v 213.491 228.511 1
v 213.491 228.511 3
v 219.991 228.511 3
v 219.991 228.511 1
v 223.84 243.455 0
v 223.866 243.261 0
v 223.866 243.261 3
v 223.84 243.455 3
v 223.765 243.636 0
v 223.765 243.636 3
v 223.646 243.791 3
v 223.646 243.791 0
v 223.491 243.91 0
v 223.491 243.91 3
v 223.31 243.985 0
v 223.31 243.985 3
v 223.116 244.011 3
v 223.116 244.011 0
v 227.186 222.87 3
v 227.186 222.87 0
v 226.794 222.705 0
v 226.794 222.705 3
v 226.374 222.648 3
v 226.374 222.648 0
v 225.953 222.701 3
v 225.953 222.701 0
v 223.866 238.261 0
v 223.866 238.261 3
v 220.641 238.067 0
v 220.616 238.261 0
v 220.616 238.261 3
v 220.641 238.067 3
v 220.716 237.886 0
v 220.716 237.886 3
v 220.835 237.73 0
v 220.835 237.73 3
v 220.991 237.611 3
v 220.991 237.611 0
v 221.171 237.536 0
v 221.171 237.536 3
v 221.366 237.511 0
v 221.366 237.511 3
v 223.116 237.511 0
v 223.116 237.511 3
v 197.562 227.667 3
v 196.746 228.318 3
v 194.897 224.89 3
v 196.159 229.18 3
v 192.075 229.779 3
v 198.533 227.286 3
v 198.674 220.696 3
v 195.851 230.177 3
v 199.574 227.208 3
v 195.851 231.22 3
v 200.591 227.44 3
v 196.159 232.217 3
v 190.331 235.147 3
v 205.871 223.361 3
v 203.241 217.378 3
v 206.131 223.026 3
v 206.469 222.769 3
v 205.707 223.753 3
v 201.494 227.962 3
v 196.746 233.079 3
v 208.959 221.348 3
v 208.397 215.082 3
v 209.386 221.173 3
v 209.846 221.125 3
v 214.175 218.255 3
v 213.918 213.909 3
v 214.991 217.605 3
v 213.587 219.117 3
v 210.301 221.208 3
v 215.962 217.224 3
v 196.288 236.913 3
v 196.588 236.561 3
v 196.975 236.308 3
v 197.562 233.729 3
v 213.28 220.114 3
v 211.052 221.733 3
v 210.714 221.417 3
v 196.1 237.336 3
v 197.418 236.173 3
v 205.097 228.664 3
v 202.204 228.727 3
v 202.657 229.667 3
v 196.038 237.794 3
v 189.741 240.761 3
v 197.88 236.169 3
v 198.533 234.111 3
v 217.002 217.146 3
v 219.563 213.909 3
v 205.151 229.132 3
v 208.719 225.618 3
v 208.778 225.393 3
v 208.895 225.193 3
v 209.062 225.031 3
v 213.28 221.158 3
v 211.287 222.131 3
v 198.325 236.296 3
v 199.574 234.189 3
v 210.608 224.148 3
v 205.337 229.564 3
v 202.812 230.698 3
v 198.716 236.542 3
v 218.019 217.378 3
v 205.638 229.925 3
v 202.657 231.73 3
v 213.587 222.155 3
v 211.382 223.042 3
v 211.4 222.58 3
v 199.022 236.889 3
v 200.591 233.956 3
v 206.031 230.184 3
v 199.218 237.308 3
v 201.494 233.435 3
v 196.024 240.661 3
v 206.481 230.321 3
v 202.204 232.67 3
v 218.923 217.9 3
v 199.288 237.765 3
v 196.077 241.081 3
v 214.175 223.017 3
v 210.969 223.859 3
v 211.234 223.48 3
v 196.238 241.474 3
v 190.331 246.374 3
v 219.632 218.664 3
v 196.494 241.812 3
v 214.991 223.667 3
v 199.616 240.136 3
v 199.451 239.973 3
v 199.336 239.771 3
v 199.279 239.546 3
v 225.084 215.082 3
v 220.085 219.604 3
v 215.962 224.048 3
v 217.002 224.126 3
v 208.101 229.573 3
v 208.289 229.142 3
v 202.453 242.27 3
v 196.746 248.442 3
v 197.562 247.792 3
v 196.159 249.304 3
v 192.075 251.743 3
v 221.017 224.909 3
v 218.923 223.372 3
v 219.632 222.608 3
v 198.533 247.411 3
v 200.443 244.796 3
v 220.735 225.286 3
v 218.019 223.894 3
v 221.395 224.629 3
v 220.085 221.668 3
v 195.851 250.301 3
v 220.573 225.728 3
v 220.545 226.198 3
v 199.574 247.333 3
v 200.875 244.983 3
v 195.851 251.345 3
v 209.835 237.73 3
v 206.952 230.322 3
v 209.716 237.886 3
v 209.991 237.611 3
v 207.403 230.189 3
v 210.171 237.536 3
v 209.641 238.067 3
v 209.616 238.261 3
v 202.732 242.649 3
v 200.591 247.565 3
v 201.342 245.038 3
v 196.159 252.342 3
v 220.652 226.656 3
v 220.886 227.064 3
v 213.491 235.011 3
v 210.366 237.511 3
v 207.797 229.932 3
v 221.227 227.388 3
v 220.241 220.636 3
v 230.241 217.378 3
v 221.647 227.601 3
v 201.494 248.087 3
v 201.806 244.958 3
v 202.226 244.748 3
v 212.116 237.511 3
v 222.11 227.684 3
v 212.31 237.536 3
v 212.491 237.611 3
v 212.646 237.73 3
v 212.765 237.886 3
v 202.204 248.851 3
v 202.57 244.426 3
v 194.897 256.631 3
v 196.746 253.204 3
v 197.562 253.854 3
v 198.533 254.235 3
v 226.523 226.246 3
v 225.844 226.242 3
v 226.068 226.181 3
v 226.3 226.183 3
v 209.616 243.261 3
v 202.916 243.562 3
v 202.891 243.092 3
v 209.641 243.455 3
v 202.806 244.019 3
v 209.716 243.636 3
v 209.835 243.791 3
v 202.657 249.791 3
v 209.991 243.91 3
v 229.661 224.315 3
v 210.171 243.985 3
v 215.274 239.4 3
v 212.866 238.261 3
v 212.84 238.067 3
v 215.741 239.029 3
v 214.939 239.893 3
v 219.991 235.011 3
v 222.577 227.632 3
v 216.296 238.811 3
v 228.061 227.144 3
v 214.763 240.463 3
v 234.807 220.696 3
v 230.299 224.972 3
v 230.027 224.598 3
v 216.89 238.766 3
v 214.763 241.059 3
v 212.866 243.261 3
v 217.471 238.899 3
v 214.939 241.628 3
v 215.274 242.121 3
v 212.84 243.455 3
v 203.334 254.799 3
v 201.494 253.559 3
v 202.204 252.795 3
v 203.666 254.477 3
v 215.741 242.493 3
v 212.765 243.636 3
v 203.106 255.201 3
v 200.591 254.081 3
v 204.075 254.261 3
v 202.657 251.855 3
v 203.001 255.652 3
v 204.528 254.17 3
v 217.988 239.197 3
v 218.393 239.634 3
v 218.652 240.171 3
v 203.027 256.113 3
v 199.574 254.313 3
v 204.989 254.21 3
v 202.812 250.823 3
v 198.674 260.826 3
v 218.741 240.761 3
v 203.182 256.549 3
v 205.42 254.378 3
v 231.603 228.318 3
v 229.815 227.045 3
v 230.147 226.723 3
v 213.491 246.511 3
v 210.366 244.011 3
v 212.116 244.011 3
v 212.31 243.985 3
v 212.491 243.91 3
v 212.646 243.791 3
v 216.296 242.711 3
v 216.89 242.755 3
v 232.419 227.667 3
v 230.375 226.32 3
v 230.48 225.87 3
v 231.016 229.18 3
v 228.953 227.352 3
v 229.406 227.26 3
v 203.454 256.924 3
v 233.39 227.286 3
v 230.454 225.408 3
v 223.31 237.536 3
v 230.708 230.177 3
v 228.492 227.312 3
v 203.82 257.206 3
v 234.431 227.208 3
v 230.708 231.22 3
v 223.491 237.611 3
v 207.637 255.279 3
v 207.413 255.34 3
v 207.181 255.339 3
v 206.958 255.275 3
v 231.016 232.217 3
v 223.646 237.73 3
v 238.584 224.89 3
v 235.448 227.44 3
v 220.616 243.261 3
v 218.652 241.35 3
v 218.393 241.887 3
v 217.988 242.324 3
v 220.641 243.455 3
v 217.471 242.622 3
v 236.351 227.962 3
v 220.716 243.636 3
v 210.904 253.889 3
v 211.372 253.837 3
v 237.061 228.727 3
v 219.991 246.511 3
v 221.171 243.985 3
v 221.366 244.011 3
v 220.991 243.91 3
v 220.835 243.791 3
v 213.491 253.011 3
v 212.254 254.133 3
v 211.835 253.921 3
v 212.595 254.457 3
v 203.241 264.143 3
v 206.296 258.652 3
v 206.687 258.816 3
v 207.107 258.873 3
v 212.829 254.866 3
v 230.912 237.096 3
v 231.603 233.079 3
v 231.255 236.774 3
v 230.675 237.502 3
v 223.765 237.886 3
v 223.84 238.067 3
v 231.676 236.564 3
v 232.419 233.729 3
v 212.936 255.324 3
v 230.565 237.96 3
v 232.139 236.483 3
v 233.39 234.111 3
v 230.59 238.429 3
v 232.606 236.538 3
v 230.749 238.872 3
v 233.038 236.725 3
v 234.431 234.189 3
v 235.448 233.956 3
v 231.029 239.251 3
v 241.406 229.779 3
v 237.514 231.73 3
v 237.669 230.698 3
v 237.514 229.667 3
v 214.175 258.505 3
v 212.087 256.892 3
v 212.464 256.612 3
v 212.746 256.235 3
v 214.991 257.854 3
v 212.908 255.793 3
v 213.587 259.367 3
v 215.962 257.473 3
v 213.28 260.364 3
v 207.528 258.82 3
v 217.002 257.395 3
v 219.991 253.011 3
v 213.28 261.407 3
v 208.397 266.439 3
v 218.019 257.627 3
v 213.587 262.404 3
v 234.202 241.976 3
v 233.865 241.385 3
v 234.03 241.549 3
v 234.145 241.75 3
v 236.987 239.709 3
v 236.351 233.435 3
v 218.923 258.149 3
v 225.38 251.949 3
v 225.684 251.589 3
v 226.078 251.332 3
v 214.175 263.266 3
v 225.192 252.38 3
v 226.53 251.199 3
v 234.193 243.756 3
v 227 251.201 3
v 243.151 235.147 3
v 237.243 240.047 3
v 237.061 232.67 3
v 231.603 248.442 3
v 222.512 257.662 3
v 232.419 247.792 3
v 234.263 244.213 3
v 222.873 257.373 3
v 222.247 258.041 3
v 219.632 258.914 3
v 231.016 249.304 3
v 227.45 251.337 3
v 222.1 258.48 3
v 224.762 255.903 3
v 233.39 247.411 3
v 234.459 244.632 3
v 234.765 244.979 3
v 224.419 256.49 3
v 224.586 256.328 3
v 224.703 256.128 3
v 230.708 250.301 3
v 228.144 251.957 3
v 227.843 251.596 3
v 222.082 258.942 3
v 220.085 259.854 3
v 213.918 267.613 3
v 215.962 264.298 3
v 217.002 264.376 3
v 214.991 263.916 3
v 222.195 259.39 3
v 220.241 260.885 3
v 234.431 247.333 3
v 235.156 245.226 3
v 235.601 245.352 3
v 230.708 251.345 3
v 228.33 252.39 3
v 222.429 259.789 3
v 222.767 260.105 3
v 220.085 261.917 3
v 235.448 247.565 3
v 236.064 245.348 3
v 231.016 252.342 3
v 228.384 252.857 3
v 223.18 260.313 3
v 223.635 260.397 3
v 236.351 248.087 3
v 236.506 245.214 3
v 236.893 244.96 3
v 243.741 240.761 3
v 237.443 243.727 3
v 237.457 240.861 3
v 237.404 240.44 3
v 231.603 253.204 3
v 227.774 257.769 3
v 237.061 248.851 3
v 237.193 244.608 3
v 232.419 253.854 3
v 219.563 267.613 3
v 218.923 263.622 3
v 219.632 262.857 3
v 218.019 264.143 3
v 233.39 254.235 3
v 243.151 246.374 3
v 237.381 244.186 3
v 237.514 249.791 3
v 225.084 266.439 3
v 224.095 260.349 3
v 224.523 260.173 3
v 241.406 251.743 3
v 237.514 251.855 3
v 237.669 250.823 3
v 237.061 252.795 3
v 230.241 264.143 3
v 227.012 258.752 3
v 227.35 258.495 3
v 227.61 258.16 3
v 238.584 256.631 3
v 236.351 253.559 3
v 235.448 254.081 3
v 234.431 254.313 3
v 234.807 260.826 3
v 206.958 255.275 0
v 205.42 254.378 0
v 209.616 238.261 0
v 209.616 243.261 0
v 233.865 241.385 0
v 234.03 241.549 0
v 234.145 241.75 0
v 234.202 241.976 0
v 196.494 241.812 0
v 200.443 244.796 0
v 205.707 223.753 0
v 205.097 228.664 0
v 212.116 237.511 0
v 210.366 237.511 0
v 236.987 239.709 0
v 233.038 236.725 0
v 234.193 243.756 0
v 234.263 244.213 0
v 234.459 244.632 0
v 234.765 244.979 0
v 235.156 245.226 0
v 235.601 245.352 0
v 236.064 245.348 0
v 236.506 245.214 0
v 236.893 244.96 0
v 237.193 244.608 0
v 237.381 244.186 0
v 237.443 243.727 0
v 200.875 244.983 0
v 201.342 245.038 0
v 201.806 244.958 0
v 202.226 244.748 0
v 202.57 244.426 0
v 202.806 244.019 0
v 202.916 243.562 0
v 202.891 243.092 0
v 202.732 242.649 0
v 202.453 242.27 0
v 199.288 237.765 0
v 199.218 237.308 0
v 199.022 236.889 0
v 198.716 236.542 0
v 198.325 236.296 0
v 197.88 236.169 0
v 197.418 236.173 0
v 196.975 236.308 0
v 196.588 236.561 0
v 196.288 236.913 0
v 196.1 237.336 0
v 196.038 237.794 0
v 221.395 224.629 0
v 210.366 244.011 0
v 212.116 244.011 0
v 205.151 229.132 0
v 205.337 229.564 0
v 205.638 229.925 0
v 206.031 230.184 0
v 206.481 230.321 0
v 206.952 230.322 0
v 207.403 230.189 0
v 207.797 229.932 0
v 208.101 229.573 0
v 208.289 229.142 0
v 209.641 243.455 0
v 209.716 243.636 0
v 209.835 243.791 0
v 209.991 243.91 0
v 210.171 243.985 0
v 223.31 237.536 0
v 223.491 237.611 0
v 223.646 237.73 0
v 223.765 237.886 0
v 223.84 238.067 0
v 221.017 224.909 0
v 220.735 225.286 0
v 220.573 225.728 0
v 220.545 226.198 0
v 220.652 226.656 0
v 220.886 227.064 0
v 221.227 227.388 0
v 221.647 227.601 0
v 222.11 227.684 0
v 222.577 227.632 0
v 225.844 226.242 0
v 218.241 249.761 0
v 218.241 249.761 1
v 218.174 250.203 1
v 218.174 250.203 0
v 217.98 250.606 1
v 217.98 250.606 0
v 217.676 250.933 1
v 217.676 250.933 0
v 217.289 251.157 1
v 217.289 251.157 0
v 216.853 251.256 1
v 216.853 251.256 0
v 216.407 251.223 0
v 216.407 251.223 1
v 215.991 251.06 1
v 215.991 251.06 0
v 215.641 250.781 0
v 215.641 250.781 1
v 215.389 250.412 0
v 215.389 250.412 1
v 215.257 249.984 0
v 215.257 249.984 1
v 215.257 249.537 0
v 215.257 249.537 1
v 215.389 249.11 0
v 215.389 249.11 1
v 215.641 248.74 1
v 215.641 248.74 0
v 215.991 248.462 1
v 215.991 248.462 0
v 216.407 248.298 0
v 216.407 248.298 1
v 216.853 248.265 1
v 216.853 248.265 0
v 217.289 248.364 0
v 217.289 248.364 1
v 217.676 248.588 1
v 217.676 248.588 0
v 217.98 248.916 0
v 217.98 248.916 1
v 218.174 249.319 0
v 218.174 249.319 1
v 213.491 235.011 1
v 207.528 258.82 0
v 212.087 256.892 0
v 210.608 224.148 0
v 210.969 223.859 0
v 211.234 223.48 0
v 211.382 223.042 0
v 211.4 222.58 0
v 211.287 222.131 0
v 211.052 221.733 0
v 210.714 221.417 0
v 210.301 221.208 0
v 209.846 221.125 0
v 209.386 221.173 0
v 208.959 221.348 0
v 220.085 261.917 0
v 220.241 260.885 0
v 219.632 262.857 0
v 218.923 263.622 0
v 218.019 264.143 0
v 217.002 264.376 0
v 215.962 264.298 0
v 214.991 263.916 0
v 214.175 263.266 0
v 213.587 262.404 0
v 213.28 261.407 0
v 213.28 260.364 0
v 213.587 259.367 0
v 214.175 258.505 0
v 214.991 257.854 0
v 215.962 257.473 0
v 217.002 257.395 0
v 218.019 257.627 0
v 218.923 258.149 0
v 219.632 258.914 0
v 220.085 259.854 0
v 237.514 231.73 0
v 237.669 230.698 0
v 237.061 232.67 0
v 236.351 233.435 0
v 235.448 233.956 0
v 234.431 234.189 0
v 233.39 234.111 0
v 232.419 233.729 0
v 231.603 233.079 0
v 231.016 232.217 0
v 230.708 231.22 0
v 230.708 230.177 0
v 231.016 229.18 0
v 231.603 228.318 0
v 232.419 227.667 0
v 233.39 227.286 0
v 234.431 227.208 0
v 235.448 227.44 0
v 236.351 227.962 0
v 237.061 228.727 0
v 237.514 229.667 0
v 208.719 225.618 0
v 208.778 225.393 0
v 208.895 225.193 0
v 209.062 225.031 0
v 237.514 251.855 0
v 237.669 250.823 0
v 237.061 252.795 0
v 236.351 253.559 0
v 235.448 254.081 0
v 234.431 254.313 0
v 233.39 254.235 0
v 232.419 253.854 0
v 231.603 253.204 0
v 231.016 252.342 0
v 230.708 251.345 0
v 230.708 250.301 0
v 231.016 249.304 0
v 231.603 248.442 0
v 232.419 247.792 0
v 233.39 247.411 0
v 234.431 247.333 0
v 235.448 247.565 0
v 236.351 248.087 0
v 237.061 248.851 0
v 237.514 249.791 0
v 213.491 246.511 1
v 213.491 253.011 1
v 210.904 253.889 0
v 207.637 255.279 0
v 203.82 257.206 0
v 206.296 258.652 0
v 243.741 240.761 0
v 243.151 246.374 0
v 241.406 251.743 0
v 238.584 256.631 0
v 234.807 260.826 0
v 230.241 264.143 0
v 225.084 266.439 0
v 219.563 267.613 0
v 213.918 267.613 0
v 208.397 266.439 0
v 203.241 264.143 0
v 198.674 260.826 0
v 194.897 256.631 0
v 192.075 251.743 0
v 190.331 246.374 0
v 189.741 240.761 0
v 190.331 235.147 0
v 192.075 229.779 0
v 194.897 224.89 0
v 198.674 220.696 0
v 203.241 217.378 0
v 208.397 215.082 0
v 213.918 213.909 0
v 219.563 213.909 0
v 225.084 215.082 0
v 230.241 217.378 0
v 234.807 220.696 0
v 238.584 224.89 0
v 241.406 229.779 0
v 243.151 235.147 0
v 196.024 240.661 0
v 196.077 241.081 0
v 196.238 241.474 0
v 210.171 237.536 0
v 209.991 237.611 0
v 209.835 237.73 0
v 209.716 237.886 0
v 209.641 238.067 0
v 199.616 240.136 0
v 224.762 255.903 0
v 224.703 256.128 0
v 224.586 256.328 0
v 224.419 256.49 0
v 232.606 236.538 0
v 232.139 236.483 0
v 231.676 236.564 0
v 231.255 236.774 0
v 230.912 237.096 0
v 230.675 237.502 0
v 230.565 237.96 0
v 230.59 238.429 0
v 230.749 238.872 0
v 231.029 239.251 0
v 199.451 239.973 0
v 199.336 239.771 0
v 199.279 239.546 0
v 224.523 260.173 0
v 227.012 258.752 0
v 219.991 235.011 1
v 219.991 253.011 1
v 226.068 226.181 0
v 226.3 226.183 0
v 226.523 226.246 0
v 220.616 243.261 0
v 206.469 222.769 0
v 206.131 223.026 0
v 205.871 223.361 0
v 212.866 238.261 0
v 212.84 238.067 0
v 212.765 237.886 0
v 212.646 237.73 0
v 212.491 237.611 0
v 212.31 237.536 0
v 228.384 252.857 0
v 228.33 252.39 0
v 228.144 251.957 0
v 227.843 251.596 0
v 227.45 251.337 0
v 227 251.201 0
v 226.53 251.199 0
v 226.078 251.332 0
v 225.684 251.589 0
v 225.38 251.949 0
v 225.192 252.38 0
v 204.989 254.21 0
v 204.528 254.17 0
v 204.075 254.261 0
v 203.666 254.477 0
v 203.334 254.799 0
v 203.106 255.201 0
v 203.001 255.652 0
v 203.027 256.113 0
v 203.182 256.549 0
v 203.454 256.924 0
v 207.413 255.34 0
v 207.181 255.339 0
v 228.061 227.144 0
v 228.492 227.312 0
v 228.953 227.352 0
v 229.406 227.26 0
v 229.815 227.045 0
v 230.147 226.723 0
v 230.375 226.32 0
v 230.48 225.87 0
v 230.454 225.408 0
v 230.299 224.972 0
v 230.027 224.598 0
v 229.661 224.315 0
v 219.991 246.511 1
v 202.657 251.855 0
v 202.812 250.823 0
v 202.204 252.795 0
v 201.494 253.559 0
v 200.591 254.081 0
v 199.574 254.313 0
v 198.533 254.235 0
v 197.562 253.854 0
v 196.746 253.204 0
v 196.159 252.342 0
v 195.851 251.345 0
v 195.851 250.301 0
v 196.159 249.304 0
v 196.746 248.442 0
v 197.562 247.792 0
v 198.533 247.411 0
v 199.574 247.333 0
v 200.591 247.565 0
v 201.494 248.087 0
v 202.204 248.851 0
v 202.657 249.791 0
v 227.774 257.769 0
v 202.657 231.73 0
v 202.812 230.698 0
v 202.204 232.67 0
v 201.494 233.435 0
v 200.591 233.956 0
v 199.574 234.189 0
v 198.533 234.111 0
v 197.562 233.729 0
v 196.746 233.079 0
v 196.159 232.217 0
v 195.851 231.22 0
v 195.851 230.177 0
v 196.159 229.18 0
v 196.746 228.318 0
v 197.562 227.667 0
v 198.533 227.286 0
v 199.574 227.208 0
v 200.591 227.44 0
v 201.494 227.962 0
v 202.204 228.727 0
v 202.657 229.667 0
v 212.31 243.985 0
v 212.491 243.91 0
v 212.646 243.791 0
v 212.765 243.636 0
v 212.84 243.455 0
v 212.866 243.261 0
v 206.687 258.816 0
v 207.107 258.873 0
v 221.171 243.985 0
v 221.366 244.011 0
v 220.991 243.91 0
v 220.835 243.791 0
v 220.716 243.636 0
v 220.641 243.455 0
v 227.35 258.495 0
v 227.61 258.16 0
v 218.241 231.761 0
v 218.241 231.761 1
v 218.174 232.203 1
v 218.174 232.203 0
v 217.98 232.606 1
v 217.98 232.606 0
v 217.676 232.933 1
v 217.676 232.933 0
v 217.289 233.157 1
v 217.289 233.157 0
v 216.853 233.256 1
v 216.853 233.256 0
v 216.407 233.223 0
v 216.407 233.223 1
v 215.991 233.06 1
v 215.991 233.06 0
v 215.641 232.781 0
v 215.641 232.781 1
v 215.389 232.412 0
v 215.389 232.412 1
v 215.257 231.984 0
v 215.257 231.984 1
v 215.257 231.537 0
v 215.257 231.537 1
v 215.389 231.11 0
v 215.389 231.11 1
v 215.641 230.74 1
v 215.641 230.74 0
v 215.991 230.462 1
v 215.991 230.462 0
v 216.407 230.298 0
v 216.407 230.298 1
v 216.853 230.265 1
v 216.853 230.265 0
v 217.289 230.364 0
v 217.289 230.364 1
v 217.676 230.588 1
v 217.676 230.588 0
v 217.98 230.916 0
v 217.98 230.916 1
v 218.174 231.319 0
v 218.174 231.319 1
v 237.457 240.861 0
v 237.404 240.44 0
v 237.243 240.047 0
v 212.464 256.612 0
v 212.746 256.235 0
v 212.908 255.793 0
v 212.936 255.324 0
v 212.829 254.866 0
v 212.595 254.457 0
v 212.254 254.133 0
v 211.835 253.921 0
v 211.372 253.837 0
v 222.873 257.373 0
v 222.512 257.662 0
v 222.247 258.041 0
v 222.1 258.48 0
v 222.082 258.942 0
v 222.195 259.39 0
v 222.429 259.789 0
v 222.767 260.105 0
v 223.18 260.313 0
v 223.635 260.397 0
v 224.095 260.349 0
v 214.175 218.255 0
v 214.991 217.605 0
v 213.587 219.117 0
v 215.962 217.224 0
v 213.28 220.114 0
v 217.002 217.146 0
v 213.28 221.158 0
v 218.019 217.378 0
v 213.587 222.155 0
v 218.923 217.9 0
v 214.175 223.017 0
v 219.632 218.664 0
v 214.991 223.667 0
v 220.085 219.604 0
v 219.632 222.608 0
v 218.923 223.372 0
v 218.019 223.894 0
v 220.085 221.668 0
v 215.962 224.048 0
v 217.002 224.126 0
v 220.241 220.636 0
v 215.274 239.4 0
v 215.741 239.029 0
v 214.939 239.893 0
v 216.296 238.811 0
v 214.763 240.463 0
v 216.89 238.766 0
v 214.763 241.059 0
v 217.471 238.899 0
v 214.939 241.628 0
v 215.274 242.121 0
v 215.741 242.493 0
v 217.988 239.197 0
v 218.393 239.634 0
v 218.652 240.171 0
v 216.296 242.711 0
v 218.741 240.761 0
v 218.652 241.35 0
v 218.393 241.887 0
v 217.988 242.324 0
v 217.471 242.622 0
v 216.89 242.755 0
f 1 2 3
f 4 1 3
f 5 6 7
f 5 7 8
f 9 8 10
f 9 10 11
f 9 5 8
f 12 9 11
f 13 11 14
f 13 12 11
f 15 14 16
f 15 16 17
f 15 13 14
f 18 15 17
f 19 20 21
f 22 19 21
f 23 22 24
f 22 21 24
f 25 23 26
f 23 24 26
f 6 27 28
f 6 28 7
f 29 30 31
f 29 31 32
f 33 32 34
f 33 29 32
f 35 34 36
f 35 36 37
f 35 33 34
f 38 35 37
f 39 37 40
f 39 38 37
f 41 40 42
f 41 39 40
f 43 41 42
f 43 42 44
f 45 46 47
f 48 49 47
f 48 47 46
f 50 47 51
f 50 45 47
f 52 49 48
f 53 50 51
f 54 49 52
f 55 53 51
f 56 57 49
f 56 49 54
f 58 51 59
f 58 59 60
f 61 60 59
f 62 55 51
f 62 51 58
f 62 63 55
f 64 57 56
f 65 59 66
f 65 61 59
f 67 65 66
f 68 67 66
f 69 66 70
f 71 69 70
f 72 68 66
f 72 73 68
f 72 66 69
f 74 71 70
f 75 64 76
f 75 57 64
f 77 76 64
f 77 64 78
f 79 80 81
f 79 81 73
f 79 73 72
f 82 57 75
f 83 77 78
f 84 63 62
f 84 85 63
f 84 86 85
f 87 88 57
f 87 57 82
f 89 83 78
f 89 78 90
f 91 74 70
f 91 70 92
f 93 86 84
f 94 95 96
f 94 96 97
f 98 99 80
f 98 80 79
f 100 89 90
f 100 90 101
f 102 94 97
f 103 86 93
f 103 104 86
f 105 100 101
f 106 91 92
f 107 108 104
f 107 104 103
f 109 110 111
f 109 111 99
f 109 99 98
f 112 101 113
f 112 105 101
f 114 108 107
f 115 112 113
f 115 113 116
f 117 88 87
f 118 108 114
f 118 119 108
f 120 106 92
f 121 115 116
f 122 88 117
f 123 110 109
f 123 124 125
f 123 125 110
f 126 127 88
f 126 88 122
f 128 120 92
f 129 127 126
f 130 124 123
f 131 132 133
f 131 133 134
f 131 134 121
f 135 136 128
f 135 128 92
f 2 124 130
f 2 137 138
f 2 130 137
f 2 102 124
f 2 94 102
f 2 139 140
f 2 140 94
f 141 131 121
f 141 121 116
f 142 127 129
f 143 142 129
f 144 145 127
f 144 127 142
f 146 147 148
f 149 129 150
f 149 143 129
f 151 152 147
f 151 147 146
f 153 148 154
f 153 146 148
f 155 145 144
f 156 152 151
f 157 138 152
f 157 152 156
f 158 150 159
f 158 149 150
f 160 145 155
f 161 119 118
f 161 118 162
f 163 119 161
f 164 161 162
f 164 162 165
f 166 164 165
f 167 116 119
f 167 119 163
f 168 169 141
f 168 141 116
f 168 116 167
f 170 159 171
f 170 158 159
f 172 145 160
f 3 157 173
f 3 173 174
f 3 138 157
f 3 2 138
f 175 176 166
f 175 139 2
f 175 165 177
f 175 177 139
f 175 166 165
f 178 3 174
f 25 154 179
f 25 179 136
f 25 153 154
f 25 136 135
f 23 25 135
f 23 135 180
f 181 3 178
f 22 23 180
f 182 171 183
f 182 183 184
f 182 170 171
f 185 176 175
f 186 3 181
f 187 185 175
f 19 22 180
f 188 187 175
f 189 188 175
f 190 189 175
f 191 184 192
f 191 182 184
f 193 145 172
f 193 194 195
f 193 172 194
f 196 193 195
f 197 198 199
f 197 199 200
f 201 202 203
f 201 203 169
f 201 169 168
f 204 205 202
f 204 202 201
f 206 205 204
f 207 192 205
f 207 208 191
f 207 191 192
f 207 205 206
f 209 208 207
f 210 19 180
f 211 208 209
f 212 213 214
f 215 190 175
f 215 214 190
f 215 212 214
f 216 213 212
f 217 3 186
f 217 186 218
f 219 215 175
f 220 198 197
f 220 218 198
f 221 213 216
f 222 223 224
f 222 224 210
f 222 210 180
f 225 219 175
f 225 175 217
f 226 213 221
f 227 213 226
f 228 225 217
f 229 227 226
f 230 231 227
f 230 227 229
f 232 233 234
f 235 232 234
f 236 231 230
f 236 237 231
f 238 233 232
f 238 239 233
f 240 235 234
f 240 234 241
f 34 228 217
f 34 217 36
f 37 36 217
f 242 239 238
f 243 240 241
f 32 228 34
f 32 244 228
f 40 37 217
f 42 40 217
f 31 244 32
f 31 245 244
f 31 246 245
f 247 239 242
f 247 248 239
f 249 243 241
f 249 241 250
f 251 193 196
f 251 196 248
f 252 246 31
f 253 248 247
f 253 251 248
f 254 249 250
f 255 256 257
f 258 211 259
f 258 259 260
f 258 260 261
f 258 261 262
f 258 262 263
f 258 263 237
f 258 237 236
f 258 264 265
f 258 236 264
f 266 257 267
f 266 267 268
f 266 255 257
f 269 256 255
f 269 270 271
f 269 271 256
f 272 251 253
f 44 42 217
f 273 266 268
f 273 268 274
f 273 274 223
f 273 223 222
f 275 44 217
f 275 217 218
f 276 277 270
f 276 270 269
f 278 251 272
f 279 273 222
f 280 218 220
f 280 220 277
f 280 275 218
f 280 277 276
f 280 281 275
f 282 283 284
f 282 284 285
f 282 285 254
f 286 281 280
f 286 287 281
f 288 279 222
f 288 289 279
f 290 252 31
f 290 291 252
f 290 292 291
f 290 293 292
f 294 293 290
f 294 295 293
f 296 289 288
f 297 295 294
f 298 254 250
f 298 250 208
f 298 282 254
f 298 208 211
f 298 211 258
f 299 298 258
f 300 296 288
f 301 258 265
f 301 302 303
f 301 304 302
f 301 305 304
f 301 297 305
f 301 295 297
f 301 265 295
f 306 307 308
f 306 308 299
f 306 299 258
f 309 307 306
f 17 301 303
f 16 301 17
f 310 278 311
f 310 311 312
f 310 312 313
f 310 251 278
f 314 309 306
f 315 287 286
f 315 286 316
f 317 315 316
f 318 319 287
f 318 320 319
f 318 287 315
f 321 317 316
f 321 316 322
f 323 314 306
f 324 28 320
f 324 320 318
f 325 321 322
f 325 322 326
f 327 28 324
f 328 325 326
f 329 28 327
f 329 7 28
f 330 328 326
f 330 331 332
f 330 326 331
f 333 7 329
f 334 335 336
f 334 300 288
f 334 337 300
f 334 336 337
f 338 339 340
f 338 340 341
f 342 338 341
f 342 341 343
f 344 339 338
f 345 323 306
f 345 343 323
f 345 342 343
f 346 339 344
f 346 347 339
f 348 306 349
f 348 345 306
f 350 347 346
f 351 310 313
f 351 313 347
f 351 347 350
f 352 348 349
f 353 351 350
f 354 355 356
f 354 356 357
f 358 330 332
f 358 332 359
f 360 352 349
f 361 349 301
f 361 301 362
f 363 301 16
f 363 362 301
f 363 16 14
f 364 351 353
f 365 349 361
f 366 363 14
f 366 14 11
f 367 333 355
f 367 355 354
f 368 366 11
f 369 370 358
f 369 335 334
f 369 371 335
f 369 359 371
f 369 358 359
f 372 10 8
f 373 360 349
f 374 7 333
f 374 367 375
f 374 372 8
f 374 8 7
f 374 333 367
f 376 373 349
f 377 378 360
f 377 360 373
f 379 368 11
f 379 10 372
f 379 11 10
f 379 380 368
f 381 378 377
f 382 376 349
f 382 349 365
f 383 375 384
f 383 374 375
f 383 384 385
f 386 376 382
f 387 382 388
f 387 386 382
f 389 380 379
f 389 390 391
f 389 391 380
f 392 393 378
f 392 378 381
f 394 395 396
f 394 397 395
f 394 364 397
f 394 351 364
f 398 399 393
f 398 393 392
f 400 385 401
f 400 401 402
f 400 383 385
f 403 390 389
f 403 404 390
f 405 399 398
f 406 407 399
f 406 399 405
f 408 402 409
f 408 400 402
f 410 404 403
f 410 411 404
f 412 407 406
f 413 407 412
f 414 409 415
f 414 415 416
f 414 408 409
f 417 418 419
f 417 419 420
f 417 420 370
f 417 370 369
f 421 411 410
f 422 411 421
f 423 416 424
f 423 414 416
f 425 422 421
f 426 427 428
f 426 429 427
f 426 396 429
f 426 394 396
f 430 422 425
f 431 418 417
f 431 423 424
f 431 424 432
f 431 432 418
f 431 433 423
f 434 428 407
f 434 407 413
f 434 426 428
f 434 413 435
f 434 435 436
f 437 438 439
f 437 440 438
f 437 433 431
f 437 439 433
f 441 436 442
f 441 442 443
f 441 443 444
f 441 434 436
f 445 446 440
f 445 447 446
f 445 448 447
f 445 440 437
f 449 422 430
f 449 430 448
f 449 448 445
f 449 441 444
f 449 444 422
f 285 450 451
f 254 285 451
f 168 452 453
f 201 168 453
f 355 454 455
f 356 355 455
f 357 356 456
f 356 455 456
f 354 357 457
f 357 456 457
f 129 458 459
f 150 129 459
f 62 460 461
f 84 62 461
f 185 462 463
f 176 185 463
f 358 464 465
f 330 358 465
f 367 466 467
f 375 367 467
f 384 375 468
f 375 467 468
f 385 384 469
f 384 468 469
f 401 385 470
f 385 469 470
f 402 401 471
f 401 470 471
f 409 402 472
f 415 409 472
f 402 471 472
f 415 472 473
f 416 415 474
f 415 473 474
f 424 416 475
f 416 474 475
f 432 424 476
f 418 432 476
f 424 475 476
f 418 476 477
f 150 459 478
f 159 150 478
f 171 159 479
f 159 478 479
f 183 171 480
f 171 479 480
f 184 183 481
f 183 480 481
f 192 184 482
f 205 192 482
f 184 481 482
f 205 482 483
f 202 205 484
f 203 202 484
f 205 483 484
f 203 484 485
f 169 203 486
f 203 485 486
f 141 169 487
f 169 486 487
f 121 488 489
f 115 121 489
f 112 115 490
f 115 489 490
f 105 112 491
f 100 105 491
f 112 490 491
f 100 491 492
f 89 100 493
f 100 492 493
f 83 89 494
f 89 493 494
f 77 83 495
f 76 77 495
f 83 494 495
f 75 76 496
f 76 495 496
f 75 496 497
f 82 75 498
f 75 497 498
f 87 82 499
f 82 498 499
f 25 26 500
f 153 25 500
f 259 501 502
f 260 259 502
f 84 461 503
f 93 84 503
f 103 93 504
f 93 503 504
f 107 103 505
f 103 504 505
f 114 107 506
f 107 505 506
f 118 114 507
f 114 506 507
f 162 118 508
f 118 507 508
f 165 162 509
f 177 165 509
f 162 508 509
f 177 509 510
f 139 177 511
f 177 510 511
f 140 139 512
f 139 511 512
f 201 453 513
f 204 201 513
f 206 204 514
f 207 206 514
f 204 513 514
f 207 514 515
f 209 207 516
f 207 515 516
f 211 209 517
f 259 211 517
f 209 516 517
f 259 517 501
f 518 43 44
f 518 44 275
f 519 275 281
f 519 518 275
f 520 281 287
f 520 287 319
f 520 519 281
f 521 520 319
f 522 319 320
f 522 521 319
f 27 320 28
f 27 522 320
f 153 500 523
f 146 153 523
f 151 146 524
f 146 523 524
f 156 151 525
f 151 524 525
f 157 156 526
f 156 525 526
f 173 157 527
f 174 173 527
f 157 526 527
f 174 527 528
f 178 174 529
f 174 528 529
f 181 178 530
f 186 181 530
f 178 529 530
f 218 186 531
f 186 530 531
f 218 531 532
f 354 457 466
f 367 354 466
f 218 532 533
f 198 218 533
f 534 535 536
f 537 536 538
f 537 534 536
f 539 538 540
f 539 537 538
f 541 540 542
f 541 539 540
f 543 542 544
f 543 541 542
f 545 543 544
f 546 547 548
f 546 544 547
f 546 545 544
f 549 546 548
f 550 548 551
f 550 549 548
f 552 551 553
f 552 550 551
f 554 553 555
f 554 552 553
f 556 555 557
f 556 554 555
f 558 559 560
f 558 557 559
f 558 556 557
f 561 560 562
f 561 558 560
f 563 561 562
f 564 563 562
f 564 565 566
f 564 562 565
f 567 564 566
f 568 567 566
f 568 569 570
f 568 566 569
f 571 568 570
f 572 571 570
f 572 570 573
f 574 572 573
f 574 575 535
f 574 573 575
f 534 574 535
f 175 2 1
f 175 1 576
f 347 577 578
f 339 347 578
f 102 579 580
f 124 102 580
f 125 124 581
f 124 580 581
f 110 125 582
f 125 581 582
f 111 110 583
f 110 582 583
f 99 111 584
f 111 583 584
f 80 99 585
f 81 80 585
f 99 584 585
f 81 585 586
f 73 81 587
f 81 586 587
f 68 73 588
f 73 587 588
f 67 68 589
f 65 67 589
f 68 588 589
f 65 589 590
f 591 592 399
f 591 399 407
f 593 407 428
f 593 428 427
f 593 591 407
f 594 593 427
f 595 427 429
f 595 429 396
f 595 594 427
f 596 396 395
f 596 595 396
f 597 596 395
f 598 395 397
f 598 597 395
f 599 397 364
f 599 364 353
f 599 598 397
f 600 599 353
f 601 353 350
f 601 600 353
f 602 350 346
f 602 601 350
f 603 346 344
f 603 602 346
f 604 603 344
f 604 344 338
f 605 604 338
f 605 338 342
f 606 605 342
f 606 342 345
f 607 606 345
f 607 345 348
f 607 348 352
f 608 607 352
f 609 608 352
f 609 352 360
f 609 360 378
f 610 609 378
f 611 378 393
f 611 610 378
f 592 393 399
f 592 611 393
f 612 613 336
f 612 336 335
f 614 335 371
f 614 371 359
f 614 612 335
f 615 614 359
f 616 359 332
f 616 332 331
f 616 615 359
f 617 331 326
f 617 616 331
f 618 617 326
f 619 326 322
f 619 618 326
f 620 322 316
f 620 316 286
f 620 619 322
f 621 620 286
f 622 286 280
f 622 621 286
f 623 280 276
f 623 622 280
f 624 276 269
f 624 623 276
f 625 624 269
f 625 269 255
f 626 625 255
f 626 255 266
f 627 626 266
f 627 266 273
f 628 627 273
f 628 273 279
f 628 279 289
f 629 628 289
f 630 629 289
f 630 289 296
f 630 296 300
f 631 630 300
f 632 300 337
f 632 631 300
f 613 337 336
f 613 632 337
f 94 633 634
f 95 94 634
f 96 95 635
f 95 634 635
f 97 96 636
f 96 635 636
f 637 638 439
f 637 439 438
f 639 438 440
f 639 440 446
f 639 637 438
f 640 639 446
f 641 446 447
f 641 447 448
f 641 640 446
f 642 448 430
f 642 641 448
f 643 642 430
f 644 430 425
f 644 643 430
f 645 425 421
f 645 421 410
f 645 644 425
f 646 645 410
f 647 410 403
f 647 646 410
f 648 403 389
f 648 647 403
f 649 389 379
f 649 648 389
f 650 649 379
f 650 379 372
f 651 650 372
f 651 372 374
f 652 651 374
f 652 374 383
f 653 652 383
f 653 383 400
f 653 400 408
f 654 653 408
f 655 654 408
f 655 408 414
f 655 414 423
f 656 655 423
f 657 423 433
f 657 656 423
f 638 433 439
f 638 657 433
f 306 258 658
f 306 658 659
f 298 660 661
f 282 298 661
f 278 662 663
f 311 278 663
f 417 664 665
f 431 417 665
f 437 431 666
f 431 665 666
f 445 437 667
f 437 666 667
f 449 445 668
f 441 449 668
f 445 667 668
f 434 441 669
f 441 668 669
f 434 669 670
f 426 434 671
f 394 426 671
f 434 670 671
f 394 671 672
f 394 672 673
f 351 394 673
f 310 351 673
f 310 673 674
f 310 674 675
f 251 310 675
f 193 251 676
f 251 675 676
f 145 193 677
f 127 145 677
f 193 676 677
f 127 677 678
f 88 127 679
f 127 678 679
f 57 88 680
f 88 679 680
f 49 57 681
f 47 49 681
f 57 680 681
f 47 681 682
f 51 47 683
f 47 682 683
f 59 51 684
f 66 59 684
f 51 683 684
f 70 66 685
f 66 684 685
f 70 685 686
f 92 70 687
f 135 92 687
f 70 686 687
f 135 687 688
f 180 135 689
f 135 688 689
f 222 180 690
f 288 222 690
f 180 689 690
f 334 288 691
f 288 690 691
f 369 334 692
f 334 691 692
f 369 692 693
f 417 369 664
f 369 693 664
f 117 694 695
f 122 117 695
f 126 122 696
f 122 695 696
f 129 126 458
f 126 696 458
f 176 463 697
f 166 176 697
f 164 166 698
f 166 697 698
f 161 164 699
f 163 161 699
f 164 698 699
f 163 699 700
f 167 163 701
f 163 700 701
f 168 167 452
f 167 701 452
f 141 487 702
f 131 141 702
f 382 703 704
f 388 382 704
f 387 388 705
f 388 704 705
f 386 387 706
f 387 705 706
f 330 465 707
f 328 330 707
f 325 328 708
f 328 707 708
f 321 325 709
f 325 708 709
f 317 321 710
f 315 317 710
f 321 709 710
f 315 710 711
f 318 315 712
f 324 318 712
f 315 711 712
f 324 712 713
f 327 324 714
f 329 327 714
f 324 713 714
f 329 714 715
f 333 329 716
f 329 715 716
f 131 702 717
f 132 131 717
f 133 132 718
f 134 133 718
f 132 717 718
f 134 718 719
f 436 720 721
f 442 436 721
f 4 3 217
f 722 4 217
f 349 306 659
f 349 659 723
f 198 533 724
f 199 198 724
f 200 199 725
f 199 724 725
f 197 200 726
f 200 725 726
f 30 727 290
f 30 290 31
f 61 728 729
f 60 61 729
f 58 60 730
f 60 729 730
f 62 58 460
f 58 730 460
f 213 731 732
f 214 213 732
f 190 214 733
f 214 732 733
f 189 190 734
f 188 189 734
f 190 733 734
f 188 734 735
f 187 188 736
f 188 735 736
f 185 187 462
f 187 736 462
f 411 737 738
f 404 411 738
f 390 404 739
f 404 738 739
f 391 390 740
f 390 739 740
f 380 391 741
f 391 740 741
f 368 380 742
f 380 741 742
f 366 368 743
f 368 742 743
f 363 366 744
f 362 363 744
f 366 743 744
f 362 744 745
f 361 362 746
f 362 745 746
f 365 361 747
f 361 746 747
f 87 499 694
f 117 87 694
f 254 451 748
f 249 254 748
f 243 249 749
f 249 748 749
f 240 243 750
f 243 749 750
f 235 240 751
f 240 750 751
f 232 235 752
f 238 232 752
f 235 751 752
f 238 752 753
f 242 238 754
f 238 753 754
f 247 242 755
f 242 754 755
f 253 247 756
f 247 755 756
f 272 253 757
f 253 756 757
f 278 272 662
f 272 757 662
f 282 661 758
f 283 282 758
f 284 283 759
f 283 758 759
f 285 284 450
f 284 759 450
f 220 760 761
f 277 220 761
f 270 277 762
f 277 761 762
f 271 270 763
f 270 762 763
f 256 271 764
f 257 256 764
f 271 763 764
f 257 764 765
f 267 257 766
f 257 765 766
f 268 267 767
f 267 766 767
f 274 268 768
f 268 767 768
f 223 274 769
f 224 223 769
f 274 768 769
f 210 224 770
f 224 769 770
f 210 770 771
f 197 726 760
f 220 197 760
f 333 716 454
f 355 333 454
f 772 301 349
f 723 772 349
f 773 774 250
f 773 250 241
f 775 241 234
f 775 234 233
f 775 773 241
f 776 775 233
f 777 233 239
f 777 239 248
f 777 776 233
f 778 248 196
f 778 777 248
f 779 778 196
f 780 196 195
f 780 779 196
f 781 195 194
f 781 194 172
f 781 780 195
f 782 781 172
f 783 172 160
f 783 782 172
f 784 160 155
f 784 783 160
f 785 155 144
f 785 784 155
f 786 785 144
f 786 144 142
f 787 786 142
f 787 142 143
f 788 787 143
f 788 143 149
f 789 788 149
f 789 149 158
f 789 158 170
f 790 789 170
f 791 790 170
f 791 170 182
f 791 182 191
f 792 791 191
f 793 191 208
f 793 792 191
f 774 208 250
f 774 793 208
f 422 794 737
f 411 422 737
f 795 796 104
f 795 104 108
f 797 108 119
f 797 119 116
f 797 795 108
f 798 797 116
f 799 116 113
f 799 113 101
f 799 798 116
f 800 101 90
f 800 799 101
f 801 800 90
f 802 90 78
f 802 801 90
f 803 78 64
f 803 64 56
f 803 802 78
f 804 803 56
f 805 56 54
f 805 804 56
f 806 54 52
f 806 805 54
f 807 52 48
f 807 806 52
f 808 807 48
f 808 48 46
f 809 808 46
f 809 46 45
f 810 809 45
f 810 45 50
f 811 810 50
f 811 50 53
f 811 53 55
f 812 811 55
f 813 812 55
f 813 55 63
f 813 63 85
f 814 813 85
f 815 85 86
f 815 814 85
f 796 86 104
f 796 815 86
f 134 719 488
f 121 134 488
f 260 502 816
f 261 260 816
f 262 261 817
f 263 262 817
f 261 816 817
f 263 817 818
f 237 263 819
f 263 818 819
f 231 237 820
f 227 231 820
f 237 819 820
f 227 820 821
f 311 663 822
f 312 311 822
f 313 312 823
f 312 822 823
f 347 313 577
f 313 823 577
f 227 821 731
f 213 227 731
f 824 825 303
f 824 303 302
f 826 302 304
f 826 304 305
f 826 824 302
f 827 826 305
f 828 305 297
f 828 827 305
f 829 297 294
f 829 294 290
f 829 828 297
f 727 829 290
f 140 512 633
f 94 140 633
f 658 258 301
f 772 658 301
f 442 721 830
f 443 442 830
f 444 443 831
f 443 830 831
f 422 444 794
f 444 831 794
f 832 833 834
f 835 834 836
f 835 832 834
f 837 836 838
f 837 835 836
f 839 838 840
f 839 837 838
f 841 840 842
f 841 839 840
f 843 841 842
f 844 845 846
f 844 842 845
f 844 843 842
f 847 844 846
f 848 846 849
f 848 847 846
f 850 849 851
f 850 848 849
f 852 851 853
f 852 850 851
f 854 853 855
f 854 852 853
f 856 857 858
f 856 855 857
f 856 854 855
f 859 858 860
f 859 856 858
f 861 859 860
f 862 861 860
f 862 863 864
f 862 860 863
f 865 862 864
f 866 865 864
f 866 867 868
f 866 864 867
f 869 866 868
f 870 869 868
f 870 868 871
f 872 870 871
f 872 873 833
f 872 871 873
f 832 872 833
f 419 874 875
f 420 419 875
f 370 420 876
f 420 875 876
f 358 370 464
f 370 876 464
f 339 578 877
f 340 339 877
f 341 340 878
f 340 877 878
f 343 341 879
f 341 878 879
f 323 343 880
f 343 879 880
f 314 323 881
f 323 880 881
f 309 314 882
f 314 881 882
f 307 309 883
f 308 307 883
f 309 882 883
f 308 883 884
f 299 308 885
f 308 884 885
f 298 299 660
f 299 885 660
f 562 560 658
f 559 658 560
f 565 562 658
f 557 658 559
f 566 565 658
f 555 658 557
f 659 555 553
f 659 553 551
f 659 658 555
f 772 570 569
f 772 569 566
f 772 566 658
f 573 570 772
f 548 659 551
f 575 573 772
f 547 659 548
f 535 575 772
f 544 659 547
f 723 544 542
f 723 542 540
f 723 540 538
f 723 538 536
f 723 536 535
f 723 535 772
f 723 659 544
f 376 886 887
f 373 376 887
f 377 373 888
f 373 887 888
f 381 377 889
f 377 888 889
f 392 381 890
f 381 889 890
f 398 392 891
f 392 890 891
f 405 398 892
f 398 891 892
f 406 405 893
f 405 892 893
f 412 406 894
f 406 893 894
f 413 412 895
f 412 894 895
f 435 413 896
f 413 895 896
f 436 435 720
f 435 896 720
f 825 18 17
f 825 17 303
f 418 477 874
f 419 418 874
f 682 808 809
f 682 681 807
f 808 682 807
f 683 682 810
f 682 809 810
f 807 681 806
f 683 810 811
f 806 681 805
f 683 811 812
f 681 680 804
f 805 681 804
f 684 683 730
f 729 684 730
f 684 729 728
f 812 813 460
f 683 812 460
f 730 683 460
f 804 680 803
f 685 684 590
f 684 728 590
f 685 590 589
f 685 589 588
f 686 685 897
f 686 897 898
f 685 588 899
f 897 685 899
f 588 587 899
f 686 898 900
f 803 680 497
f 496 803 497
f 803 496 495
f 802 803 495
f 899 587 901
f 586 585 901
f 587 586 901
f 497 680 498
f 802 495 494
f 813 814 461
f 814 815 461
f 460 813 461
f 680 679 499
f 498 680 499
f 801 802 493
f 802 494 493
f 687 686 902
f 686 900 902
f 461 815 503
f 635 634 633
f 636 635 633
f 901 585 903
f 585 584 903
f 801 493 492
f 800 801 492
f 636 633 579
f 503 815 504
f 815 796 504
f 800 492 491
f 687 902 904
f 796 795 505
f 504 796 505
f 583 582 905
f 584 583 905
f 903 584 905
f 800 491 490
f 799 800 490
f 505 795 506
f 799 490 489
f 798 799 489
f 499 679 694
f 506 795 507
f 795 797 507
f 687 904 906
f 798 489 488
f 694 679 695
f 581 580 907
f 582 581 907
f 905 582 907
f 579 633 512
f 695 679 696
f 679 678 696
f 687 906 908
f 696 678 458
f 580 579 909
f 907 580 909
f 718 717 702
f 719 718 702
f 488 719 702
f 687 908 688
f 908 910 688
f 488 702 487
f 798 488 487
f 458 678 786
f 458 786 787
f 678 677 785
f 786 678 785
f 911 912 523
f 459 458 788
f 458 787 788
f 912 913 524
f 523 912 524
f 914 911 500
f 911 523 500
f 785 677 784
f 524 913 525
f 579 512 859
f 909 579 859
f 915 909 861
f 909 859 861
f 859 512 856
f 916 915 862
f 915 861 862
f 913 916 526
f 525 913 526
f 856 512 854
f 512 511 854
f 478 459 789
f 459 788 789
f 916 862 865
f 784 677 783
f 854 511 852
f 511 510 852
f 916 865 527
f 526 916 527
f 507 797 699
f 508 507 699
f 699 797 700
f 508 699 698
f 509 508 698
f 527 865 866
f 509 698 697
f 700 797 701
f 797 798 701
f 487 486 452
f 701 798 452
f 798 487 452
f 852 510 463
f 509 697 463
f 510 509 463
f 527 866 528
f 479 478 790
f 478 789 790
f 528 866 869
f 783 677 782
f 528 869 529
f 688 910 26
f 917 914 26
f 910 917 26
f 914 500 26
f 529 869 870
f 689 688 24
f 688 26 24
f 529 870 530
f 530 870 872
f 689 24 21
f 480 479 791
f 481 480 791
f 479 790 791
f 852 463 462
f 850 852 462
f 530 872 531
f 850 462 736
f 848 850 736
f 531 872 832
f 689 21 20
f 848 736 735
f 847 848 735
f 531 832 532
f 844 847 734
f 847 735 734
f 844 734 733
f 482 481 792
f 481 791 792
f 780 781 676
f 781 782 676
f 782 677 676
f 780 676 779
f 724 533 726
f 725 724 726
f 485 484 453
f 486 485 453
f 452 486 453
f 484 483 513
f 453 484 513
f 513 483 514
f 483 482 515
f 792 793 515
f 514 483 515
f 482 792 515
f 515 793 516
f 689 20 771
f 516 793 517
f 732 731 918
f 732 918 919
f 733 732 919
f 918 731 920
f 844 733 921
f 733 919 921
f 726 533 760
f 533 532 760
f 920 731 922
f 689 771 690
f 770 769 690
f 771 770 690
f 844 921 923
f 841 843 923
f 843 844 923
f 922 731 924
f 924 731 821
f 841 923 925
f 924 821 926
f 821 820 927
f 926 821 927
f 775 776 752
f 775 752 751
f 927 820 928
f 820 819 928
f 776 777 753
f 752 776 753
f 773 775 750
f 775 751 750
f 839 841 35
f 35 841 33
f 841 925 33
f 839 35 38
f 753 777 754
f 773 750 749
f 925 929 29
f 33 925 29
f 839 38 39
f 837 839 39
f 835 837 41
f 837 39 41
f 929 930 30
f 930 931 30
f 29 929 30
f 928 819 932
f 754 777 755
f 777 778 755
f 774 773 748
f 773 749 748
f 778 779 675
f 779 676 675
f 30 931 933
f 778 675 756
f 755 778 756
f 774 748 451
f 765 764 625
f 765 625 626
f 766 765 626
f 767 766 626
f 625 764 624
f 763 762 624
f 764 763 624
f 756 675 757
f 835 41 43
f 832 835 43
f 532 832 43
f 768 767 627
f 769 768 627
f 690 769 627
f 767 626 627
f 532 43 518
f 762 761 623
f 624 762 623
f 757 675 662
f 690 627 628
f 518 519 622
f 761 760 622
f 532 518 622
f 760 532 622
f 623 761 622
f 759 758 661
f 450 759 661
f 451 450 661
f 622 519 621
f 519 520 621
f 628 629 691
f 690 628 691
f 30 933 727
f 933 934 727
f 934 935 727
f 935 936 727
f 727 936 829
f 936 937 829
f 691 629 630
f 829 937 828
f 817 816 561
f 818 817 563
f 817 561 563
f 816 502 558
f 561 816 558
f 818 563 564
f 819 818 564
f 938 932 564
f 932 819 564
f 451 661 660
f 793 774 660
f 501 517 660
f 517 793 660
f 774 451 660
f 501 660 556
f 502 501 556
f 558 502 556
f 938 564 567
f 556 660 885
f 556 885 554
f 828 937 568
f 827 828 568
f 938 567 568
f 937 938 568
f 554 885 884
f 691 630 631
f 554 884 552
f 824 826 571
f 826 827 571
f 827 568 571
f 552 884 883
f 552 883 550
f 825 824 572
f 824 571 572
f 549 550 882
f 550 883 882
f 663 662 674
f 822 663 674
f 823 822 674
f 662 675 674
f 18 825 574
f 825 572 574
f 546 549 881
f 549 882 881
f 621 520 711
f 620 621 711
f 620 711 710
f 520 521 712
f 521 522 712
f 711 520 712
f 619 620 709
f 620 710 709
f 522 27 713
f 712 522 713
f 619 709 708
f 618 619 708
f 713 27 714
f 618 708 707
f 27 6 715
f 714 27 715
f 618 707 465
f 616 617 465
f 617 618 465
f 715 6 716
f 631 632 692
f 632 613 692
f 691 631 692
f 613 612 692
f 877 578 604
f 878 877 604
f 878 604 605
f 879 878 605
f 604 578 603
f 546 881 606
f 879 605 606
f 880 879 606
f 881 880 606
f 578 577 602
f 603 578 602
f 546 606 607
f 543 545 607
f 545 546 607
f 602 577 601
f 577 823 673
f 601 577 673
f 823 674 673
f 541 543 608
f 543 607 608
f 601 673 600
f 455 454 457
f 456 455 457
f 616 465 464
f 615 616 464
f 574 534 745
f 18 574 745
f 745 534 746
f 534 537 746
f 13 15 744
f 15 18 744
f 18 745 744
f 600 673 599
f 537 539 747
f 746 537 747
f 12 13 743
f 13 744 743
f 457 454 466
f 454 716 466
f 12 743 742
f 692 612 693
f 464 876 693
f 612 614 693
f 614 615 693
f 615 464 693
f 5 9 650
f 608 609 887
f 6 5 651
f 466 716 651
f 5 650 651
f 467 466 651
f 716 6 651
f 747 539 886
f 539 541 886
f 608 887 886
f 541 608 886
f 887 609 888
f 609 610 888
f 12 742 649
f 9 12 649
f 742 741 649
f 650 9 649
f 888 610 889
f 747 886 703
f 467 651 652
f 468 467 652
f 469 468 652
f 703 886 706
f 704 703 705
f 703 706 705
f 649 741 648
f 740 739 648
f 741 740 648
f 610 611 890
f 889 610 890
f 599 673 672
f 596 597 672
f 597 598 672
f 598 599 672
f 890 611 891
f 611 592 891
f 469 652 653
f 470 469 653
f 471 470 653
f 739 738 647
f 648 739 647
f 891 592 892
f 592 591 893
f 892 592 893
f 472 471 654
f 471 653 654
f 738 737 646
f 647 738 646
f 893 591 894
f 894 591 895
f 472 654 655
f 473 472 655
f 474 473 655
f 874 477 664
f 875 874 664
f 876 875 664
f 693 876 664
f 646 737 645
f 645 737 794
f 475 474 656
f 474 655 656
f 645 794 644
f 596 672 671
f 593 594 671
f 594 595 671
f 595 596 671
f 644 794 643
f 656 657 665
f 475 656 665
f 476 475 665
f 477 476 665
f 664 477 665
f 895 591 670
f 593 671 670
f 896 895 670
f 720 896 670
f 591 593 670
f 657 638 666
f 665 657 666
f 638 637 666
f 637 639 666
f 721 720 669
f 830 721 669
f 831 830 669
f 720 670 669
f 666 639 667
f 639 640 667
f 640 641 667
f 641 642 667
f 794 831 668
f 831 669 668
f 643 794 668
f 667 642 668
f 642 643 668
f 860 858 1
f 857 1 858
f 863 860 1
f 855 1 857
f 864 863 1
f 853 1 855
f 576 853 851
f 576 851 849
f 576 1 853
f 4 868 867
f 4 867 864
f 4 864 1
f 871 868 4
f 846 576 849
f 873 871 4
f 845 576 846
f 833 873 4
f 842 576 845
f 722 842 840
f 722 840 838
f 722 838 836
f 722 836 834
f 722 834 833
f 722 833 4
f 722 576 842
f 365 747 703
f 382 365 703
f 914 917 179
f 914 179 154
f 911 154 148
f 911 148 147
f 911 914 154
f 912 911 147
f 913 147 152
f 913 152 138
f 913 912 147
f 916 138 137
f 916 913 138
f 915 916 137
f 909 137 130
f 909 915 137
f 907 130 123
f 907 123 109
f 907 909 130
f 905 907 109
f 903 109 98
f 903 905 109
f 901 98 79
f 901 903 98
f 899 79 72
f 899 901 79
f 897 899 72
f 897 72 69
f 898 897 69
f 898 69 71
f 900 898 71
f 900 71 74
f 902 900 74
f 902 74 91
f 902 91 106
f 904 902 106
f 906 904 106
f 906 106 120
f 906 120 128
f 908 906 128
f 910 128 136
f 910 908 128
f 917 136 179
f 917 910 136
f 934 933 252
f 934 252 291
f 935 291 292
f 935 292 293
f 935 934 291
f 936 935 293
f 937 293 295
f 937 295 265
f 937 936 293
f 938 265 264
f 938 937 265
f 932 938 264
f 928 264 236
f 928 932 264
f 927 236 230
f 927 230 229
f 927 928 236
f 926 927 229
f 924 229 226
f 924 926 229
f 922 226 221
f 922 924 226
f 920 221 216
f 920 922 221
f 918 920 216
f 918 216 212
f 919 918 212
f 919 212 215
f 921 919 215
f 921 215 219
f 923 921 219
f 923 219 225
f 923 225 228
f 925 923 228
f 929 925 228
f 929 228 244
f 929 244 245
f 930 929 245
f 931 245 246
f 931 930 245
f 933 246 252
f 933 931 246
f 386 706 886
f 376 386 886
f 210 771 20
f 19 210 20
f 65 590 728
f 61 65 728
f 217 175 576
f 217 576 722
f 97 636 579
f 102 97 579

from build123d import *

# Parameters (mm, degrees)
MODEL_R                 = 27
MODEL_R_2               = 1.5
MODEL_R_3               = 3.5
MODEL_R_4               = 2
SALIENTE_EXTRUIR1_DEPTH = 3
CROQUIS2_W              = 6.5
CROQUIS2_H              = 6.5
CORTAR_EXTRUIR1_DEPTH   = 2


with BuildPart() as part:
    # Model → Saliente-Extruir1 (new body)
    with BuildSketch(Plane.XY):
        with Locations((216.74059699, 240.760681356)):
            Circle(MODEL_R)
        with Locations((216.74059699, 249.760681356)):
            Circle(MODEL_R_2, mode=Mode.SUBTRACT)
        with BuildLine():
            ThreePointArc((208.719111811, 225.617882009), (208.829996246, 225.28915626), (209.06215237, 225.03135884))
            Line((209.06215237, 225.03135884), (210.608223397, 224.148384774))
            ThreePointArc((210.608223397, 224.148384774), (211.183432146, 221.923579716), (208.958627088, 221.348370966))
            Line((208.958627088, 221.348370966), (206.468987847, 222.769480989))
            ThreePointArc((206.468987847, 222.769480989), (205.990273761, 223.185226154), (205.707098402, 223.752520553))
            Line((205.707098402, 223.752520553), (205.097225271, 228.664367063))
            ThreePointArc((205.097225271, 228.664367063), (206.481118716, 230.320700093), (208.289058497, 229.141737021))
            Line((208.289058497, 229.141737021), (208.719111811, 225.617882009))
        make_face(mode=Mode.SUBTRACT)
        with Locations((199.312171932, 230.698375457)):
            Circle(MODEL_R_3, mode=Mode.SUBTRACT)
        with BuildLine():
            ThreePointArc((199.615805481, 240.136091624), (199.38656285, 239.875700011), (199.279381797, 239.5457482))
            Line((199.279381797, 239.5457482), (199.287739338, 237.765324382))
            ThreePointArc((199.287739338, 237.765324382), (197.648606014, 236.154776464), (196.038058096, 237.793909788))
            Line((196.038058096, 237.793909788), (196.023955856, 240.660555628))
            ThreePointArc((196.023955856, 240.660555628), (196.144644688, 241.283006771), (196.494348369, 241.811891025))
            Line((196.494348369, 241.811891025), (200.44319566, 244.795979904))
            ThreePointArc((200.44319566, 244.795979904), (202.569568865, 244.42565954), (202.452526784, 242.270456224))
            Line((202.452526784, 242.270456224), (199.615805481, 240.136091624))
        make_face(mode=Mode.SUBTRACT)
        with Locations((216.74059699, 220.636069558)):
            Circle(MODEL_R_3, mode=Mode.SUBTRACT)
        with BuildLine():
            ThreePointArc((225.84390332, 226.242471741), (226.184030387, 226.174137605), (226.523367563, 226.246291995))
            Line((226.523367563, 226.246291995), (228.061081049, 227.143741747))
            ThreePointArc((228.061081049, 227.143741747), (230.275423122, 226.529484608), (229.661165983, 224.315142535))
            Line((229.661165983, 224.315142535), (227.185628981, 222.869606716))
            ThreePointArc((227.185628981, 222.869606716), (226.586226063, 222.662900739), (225.953347023, 222.701310884))
            Line((225.953347023, 222.701310884), (221.3946266, 224.629068514))
            ThreePointArc((221.3946266, 224.629068514), (220.652146842, 226.65572191), (222.577128703, 227.631962152))
            Line((222.577128703, 227.631962152), (225.84390332, 226.242471741))
        make_face(mode=Mode.SUBTRACT)
        with Locations((234.169022048, 230.698375457)):
            Circle(MODEL_R_3, mode=Mode.SUBTRACT)
        with Locations((199.312171932, 250.822987255)):
            Circle(MODEL_R_3, mode=Mode.SUBTRACT)
        with BuildLine():
            ThreePointArc((209.61559699, 243.260681356), (209.835266904, 243.791011442), (210.36559699, 244.010681356))
            Line((210.36559699, 244.010681356), (212.11559699, 244.010681356))
            ThreePointArc((212.11559699, 244.010681356), (212.645927076, 243.791011442), (212.86559699, 243.260681356))
            Line((212.86559699, 243.260681356), (212.86559699, 238.260681356))
            ThreePointArc((212.86559699, 238.260681356), (212.645927076, 237.73035127), (212.11559699, 237.510681356))
            Line((212.11559699, 237.510681356), (210.36559699, 237.510681356))
            ThreePointArc((210.36559699, 237.510681356), (209.835266904, 237.73035127), (209.61559699, 238.260681356))
            Line((209.61559699, 238.260681356), (209.61559699, 243.260681356))
        make_face(mode=Mode.SUBTRACT)
        with BuildLine():
            ThreePointArc((207.637290661, 255.278890971), (207.297163594, 255.347225107), (206.957826417, 255.275070717))
            Line((206.957826417, 255.275070717), (205.420112932, 254.377620965))
            ThreePointArc((205.420112932, 254.377620965), (203.205770858, 254.991878104), (203.820027998, 257.206220177))
            Line((203.820027998, 257.206220177), (206.295564999, 258.651755995))
            ThreePointArc((206.295564999, 258.651755995), (206.894967917, 258.858461972), (207.527846958, 258.820051828))
            Line((207.527846958, 258.820051828), (212.08656738, 256.892294198))
            ThreePointArc((212.08656738, 256.892294198), (212.829047139, 254.865640802), (210.904065277, 253.889400559))
            Line((210.904065277, 253.889400559), (207.637290661, 255.278890971))
        make_face(mode=Mode.SUBTRACT)
        with Locations((216.74059699, 240.760681356)):
            Circle(MODEL_R_4, mode=Mode.SUBTRACT)
        with BuildLine():
            Line((221.36559699, 244.010681356), (223.11559699, 244.010681356))
            ThreePointArc((223.11559699, 244.010681356), (223.645927076, 243.791011442), (223.86559699, 243.260681356))
            Line((223.86559699, 243.260681356), (223.86559699, 238.260681356))
            ThreePointArc((223.86559699, 238.260681356), (223.645927076, 237.73035127), (223.11559699, 237.510681356))
            Line((223.11559699, 237.510681356), (221.36559699, 237.510681356))
            ThreePointArc((221.36559699, 237.510681356), (220.835266904, 237.73035127), (220.61559699, 238.260681356))
            Line((220.61559699, 238.260681356), (220.61559699, 243.260681356))
            ThreePointArc((220.61559699, 243.260681356), (220.835266904, 243.791011442), (221.36559699, 244.010681356))
        make_face(mode=Mode.SUBTRACT)
        with BuildLine():
            ThreePointArc((227.012206134, 258.751881723), (227.49092022, 258.336136558), (227.774095579, 257.768842159))
            Line((227.774095579, 257.768842159), (228.38396871, 252.856995649))
            ThreePointArc((228.38396871, 252.856995649), (227.000075264, 251.200662618), (225.192135483, 252.379625691))
            Line((225.192135483, 252.379625691), (224.76208217, 255.903480703))
            ThreePointArc((224.76208217, 255.903480703), (224.651197734, 256.232206452), (224.41904161, 256.490003872))
            Line((224.41904161, 256.490003872), (222.872970584, 257.372977938))
            ThreePointArc((222.872970584, 257.372977938), (222.297761834, 259.597782996), (224.522566892, 260.172991745))
            Line((224.522566892, 260.172991745), (227.012206134, 258.751881723))
        make_face(mode=Mode.SUBTRACT)
        with BuildLine():
            ThreePointArc((233.865388499, 241.385271088), (234.09463113, 241.6456627), (234.201812184, 241.975614511))
            Line((234.201812184, 241.975614511), (234.193454642, 243.75603833))
            ThreePointArc((234.193454642, 243.75603833), (235.832587966, 245.366586248), (237.443135884, 243.727452924))
            Line((237.443135884, 243.727452924), (237.457238125, 240.860807084))
            ThreePointArc((237.457238125, 240.860807084), (237.336549293, 240.238355941), (236.986845611, 239.709471687))
            Line((236.986845611, 239.709471687), (233.03799832, 236.725382808))
            ThreePointArc((233.03799832, 236.725382808), (230.911625115, 237.095703172), (231.028667196, 239.250906488))
            Line((231.028667196, 239.250906488), (233.865388499, 241.385271088))
        make_face(mode=Mode.SUBTRACT)
        with Locations((234.169022048, 250.822987255)):
            Circle(MODEL_R_3, mode=Mode.SUBTRACT)
        with Locations((216.74059699, 260.885293153)):
            Circle(MODEL_R_3, mode=Mode.SUBTRACT)
        with Locations((216.74059699, 231.760681356)):
            Circle(MODEL_R_2, mode=Mode.SUBTRACT)
    extrude(amount=SALIENTE_EXTRUIR1_DEPTH)

    # Croquis2 → Cortar-Extruir1 (cut)
    with BuildSketch(Plane.XY.offset(3)):
        with Locations((216.74059699, 249.760681356)):
            Rectangle(CROQUIS2_W, CROQUIS2_H)
        with Locations((216.74059699, 231.760681356)):
            Rectangle(CROQUIS2_W, CROQUIS2_H)
    extrude(amount=-CORTAR_EXTRUIR1_DEPTH, mode=Mode.SUBTRACT)


solid = part.part
